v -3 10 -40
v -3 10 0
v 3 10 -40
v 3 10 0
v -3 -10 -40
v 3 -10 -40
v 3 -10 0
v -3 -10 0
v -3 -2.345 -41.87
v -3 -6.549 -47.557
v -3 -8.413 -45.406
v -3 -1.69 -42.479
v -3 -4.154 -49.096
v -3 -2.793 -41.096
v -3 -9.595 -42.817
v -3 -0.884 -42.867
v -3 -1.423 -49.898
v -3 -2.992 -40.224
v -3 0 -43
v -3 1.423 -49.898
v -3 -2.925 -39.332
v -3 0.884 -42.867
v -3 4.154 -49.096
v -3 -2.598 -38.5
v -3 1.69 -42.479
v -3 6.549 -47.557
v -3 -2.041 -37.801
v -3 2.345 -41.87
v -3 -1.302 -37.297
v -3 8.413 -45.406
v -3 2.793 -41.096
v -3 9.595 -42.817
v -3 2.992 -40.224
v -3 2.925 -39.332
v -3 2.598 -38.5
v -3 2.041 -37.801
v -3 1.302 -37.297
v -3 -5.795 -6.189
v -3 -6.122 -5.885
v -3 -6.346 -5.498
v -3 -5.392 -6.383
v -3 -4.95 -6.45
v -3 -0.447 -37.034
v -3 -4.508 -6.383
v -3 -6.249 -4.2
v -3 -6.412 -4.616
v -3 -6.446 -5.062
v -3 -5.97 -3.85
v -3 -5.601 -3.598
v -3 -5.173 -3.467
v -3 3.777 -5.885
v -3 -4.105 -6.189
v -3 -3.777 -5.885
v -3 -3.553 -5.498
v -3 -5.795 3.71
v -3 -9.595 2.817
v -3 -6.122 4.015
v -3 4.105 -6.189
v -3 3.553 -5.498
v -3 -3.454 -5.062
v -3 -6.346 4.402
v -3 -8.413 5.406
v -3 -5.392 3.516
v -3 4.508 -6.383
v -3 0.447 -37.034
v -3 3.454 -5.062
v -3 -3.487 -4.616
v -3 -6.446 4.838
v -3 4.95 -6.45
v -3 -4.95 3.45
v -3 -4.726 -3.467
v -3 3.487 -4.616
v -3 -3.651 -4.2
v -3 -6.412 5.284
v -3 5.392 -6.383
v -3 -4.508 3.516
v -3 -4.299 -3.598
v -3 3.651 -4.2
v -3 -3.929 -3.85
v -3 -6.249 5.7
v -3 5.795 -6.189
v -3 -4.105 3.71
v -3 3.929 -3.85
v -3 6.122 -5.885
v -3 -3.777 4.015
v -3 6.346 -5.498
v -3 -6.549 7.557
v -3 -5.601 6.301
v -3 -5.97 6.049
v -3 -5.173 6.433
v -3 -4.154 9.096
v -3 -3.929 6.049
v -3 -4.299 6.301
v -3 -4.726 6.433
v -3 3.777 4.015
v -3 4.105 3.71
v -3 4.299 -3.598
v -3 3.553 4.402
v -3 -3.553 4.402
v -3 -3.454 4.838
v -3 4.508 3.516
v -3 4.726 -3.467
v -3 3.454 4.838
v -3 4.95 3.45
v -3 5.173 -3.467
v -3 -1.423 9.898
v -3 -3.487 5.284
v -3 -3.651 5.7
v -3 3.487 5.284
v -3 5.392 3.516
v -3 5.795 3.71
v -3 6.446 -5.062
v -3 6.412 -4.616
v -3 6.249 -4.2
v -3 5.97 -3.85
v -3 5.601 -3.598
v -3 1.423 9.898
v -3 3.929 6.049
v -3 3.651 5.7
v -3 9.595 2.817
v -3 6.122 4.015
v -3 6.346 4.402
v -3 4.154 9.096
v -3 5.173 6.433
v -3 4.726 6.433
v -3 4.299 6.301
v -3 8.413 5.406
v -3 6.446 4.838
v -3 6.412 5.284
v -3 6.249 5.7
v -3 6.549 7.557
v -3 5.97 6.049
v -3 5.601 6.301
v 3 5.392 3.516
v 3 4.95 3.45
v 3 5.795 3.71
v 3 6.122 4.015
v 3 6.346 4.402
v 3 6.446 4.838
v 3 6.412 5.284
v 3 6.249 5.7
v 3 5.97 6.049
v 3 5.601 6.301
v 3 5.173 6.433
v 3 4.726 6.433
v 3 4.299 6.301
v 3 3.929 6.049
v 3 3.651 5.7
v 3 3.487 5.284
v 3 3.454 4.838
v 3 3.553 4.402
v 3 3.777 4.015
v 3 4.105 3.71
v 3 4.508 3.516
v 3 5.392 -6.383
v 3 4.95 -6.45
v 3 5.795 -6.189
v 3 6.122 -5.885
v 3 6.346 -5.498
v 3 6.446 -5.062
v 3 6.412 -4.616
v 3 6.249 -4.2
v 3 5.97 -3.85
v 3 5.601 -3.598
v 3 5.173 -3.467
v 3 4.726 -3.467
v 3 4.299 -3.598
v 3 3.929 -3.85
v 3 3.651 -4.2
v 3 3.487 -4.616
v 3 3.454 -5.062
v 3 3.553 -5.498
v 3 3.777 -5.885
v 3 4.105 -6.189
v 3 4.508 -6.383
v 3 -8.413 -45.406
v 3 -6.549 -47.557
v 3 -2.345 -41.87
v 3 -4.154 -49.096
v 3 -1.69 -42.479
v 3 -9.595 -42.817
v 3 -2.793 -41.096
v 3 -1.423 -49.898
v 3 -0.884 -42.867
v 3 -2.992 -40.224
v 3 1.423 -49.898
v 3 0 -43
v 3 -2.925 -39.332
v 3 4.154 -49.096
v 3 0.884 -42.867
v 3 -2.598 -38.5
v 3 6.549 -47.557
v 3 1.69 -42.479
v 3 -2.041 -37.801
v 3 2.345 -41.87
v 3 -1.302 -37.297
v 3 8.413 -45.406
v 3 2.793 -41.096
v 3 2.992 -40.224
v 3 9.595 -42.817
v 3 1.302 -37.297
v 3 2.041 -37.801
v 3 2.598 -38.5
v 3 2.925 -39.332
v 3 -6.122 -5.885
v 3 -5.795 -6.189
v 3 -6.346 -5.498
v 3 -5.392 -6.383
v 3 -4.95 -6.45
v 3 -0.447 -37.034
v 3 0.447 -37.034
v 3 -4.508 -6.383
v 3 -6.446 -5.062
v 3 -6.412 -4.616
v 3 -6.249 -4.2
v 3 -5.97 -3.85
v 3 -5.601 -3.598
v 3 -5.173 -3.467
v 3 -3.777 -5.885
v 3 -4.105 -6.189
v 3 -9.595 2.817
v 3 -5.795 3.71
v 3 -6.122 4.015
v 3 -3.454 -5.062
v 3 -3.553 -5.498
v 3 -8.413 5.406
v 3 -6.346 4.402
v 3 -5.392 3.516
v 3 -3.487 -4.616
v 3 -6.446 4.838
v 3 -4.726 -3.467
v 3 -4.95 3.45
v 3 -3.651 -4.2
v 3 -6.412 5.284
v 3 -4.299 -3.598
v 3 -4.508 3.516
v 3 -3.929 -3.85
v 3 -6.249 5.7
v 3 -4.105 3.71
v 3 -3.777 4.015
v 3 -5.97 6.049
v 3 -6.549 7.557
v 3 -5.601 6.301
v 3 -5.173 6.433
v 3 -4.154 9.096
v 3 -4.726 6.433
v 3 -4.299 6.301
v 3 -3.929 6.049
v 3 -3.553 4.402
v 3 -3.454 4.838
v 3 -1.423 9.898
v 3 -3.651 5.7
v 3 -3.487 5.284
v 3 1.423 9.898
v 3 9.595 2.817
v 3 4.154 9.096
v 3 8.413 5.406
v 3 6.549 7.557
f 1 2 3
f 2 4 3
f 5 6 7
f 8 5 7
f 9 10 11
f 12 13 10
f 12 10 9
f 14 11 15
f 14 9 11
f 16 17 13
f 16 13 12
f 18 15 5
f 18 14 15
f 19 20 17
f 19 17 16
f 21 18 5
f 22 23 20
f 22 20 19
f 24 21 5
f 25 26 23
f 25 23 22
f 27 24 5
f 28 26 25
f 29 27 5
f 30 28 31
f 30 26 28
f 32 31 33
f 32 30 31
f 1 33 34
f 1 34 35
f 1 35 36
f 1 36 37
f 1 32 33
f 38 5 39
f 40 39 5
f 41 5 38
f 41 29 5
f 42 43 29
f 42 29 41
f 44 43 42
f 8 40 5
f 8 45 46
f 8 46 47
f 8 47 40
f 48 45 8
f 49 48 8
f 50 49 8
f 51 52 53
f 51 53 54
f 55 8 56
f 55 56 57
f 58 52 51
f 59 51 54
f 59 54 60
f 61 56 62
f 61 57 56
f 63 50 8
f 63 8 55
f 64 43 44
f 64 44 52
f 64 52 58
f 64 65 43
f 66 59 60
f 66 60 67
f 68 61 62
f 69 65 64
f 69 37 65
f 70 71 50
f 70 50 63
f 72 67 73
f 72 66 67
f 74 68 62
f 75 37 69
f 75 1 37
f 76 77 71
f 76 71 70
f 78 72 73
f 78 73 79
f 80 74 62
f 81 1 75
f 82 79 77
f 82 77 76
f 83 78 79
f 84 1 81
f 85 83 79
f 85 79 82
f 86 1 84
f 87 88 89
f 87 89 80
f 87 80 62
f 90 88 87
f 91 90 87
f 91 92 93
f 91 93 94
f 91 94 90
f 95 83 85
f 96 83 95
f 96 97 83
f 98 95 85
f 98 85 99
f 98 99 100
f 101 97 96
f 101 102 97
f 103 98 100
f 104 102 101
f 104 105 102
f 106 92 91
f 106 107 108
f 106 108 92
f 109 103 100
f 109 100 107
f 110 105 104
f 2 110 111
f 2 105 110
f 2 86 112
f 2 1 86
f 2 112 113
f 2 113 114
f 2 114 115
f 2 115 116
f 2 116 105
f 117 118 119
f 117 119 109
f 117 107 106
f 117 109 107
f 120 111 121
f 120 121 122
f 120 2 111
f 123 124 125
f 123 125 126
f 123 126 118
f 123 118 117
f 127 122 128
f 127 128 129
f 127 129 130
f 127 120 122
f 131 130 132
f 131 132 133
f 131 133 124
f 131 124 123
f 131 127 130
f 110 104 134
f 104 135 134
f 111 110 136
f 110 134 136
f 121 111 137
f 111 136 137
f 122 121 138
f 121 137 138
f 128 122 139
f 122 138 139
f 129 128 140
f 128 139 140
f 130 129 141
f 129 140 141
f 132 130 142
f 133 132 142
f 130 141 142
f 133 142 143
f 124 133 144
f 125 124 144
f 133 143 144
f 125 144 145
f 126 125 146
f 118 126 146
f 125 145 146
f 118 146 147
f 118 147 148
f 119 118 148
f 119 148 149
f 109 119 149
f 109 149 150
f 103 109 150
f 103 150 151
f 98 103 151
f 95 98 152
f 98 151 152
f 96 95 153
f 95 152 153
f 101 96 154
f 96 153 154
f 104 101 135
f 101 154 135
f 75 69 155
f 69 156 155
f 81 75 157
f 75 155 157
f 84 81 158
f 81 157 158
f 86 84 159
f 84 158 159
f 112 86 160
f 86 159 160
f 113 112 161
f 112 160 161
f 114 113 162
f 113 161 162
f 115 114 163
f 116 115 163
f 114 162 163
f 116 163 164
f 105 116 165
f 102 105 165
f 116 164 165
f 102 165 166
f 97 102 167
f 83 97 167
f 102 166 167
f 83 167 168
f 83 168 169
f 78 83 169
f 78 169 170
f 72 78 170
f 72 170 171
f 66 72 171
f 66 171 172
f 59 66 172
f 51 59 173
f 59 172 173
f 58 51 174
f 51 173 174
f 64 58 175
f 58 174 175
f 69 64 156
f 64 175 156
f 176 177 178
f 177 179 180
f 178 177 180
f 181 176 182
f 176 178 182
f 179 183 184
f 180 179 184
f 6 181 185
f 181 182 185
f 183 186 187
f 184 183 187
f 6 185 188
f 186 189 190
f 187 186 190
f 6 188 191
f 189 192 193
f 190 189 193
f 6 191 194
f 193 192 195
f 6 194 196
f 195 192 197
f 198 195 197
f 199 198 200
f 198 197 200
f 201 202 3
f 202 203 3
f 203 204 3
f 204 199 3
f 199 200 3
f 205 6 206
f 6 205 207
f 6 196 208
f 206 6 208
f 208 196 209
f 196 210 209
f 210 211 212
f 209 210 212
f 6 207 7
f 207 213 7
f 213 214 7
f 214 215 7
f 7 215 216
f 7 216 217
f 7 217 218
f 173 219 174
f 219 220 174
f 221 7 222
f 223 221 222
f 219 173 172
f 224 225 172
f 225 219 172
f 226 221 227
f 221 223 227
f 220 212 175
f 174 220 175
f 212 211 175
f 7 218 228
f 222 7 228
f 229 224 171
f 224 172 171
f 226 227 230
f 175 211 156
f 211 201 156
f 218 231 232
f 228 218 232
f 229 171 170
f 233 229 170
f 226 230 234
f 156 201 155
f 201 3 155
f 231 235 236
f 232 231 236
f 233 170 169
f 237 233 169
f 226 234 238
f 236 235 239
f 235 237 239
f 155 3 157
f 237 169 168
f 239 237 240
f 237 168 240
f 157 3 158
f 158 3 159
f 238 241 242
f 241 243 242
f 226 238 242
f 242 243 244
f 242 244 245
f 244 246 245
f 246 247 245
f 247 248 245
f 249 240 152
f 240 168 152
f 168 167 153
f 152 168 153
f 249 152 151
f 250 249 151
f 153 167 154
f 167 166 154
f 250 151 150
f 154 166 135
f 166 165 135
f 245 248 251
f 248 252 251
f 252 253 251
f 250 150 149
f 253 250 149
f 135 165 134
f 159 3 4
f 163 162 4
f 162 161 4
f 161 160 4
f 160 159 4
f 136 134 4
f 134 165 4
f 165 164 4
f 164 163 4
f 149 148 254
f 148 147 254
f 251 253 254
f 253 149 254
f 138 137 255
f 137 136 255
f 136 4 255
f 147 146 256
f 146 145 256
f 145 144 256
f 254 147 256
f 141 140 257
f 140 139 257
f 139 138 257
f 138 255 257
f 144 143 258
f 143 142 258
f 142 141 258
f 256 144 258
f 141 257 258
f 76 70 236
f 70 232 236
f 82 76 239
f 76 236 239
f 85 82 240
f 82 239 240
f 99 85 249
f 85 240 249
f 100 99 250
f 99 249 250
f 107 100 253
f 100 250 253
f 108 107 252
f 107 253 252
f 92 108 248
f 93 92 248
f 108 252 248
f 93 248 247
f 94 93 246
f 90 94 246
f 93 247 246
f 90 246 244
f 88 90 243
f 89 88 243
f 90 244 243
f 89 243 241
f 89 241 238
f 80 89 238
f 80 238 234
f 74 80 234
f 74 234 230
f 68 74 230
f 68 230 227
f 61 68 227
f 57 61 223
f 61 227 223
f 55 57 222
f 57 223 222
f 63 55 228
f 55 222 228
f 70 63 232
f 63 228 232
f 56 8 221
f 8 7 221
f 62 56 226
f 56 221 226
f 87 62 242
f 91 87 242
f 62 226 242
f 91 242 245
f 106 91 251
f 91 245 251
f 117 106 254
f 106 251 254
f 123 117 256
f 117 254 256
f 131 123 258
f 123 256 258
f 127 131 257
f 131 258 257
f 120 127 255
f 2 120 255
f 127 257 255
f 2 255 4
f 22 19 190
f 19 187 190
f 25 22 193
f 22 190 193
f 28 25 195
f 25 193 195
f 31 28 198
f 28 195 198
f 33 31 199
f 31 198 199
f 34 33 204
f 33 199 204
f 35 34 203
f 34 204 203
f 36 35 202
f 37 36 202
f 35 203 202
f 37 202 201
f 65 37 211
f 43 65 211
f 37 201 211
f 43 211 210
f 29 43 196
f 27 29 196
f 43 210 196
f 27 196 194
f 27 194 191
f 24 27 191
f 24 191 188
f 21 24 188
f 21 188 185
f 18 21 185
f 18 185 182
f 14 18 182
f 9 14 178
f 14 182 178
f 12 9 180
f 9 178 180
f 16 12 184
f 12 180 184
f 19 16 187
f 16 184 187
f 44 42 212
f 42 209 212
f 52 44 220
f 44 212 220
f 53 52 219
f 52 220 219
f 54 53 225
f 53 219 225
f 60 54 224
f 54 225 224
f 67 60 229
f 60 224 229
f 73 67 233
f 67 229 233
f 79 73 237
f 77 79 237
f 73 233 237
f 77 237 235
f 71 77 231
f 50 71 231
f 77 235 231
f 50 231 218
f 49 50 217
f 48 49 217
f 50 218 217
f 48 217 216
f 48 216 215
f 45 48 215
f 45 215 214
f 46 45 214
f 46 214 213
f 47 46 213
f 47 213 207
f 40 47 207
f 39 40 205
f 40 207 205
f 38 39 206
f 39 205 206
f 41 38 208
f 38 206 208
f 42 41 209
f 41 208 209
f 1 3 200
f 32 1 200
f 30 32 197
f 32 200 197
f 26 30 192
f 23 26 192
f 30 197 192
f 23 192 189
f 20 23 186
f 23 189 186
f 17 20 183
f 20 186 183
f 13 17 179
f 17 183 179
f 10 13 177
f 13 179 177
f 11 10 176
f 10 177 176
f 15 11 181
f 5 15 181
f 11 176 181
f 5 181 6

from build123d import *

# Parameters (mm, degrees)
BOSS_EXTRUDE1_DEPTH     = 3
SKETCH2_R               = 1.5
CUT_EXTRUDE1_DEPTH      = 4
CUT_EXTRUDE1_DEPTH_BACK = 4
SKETCH3_R               = 3
CUT_EXTRUDE2_DEPTH      = 4
CUT_EXTRUDE2_DEPTH_BACK = 4


with BuildPart() as part:
    # Sketch1 → Boss-Extrude1 (new body, symmetric)
    with BuildSketch(Plane(origin=(0, 0, 0), x_dir=(0, 0, -1), z_dir=(1, 0, 0))):
        with BuildLine():
            Line((40, -10), (0, -10))
            ThreePointArc((0, -10), (-10, 0), (0, 10))
            Line((0, 10), (40, 10))
            ThreePointArc((40, 10), (50, 0), (40, -10))
        make_face()
    extrude(amount=BOSS_EXTRUDE1_DEPTH, both=True)

    # Sketch2 → Cut-Extrude1 (cut, two sides)
    with BuildSketch(Plane(origin=(0, 0, 0), x_dir=(0, 0, -1), z_dir=(1, 0, 0))) as cut_extrude1_sk:
        with Locations((4.949747468, 4.949747468)):
            Circle(SKETCH2_R)
        with Locations((4.949747468, -4.949747468)):
            Circle(SKETCH2_R)
        with Locations((-4.949747468, -4.949747468)):
            Circle(SKETCH2_R)
        with Locations((-4.949747468, 4.949747468)):
            Circle(SKETCH2_R)
    extrude(amount=CUT_EXTRUDE1_DEPTH, mode=Mode.SUBTRACT)
    extrude(cut_extrude1_sk.sketch, amount=-CUT_EXTRUDE1_DEPTH_BACK, mode=Mode.SUBTRACT)

    # Sketch3 → Cut-Extrude2 (cut, two sides)
    with BuildSketch(Plane(origin=(0, 0, 0), x_dir=(0, 0, -1), z_dir=(1, 0, 0))) as cut_extrude2_sk:
        with Locations((40, 0)):
            Circle(SKETCH3_R)
    extrude(amount=CUT_EXTRUDE2_DEPTH, mode=Mode.SUBTRACT)
    extrude(cut_extrude2_sk.sketch, amount=-CUT_EXTRUDE2_DEPTH_BACK, mode=Mode.SUBTRACT)


solid = part.part
